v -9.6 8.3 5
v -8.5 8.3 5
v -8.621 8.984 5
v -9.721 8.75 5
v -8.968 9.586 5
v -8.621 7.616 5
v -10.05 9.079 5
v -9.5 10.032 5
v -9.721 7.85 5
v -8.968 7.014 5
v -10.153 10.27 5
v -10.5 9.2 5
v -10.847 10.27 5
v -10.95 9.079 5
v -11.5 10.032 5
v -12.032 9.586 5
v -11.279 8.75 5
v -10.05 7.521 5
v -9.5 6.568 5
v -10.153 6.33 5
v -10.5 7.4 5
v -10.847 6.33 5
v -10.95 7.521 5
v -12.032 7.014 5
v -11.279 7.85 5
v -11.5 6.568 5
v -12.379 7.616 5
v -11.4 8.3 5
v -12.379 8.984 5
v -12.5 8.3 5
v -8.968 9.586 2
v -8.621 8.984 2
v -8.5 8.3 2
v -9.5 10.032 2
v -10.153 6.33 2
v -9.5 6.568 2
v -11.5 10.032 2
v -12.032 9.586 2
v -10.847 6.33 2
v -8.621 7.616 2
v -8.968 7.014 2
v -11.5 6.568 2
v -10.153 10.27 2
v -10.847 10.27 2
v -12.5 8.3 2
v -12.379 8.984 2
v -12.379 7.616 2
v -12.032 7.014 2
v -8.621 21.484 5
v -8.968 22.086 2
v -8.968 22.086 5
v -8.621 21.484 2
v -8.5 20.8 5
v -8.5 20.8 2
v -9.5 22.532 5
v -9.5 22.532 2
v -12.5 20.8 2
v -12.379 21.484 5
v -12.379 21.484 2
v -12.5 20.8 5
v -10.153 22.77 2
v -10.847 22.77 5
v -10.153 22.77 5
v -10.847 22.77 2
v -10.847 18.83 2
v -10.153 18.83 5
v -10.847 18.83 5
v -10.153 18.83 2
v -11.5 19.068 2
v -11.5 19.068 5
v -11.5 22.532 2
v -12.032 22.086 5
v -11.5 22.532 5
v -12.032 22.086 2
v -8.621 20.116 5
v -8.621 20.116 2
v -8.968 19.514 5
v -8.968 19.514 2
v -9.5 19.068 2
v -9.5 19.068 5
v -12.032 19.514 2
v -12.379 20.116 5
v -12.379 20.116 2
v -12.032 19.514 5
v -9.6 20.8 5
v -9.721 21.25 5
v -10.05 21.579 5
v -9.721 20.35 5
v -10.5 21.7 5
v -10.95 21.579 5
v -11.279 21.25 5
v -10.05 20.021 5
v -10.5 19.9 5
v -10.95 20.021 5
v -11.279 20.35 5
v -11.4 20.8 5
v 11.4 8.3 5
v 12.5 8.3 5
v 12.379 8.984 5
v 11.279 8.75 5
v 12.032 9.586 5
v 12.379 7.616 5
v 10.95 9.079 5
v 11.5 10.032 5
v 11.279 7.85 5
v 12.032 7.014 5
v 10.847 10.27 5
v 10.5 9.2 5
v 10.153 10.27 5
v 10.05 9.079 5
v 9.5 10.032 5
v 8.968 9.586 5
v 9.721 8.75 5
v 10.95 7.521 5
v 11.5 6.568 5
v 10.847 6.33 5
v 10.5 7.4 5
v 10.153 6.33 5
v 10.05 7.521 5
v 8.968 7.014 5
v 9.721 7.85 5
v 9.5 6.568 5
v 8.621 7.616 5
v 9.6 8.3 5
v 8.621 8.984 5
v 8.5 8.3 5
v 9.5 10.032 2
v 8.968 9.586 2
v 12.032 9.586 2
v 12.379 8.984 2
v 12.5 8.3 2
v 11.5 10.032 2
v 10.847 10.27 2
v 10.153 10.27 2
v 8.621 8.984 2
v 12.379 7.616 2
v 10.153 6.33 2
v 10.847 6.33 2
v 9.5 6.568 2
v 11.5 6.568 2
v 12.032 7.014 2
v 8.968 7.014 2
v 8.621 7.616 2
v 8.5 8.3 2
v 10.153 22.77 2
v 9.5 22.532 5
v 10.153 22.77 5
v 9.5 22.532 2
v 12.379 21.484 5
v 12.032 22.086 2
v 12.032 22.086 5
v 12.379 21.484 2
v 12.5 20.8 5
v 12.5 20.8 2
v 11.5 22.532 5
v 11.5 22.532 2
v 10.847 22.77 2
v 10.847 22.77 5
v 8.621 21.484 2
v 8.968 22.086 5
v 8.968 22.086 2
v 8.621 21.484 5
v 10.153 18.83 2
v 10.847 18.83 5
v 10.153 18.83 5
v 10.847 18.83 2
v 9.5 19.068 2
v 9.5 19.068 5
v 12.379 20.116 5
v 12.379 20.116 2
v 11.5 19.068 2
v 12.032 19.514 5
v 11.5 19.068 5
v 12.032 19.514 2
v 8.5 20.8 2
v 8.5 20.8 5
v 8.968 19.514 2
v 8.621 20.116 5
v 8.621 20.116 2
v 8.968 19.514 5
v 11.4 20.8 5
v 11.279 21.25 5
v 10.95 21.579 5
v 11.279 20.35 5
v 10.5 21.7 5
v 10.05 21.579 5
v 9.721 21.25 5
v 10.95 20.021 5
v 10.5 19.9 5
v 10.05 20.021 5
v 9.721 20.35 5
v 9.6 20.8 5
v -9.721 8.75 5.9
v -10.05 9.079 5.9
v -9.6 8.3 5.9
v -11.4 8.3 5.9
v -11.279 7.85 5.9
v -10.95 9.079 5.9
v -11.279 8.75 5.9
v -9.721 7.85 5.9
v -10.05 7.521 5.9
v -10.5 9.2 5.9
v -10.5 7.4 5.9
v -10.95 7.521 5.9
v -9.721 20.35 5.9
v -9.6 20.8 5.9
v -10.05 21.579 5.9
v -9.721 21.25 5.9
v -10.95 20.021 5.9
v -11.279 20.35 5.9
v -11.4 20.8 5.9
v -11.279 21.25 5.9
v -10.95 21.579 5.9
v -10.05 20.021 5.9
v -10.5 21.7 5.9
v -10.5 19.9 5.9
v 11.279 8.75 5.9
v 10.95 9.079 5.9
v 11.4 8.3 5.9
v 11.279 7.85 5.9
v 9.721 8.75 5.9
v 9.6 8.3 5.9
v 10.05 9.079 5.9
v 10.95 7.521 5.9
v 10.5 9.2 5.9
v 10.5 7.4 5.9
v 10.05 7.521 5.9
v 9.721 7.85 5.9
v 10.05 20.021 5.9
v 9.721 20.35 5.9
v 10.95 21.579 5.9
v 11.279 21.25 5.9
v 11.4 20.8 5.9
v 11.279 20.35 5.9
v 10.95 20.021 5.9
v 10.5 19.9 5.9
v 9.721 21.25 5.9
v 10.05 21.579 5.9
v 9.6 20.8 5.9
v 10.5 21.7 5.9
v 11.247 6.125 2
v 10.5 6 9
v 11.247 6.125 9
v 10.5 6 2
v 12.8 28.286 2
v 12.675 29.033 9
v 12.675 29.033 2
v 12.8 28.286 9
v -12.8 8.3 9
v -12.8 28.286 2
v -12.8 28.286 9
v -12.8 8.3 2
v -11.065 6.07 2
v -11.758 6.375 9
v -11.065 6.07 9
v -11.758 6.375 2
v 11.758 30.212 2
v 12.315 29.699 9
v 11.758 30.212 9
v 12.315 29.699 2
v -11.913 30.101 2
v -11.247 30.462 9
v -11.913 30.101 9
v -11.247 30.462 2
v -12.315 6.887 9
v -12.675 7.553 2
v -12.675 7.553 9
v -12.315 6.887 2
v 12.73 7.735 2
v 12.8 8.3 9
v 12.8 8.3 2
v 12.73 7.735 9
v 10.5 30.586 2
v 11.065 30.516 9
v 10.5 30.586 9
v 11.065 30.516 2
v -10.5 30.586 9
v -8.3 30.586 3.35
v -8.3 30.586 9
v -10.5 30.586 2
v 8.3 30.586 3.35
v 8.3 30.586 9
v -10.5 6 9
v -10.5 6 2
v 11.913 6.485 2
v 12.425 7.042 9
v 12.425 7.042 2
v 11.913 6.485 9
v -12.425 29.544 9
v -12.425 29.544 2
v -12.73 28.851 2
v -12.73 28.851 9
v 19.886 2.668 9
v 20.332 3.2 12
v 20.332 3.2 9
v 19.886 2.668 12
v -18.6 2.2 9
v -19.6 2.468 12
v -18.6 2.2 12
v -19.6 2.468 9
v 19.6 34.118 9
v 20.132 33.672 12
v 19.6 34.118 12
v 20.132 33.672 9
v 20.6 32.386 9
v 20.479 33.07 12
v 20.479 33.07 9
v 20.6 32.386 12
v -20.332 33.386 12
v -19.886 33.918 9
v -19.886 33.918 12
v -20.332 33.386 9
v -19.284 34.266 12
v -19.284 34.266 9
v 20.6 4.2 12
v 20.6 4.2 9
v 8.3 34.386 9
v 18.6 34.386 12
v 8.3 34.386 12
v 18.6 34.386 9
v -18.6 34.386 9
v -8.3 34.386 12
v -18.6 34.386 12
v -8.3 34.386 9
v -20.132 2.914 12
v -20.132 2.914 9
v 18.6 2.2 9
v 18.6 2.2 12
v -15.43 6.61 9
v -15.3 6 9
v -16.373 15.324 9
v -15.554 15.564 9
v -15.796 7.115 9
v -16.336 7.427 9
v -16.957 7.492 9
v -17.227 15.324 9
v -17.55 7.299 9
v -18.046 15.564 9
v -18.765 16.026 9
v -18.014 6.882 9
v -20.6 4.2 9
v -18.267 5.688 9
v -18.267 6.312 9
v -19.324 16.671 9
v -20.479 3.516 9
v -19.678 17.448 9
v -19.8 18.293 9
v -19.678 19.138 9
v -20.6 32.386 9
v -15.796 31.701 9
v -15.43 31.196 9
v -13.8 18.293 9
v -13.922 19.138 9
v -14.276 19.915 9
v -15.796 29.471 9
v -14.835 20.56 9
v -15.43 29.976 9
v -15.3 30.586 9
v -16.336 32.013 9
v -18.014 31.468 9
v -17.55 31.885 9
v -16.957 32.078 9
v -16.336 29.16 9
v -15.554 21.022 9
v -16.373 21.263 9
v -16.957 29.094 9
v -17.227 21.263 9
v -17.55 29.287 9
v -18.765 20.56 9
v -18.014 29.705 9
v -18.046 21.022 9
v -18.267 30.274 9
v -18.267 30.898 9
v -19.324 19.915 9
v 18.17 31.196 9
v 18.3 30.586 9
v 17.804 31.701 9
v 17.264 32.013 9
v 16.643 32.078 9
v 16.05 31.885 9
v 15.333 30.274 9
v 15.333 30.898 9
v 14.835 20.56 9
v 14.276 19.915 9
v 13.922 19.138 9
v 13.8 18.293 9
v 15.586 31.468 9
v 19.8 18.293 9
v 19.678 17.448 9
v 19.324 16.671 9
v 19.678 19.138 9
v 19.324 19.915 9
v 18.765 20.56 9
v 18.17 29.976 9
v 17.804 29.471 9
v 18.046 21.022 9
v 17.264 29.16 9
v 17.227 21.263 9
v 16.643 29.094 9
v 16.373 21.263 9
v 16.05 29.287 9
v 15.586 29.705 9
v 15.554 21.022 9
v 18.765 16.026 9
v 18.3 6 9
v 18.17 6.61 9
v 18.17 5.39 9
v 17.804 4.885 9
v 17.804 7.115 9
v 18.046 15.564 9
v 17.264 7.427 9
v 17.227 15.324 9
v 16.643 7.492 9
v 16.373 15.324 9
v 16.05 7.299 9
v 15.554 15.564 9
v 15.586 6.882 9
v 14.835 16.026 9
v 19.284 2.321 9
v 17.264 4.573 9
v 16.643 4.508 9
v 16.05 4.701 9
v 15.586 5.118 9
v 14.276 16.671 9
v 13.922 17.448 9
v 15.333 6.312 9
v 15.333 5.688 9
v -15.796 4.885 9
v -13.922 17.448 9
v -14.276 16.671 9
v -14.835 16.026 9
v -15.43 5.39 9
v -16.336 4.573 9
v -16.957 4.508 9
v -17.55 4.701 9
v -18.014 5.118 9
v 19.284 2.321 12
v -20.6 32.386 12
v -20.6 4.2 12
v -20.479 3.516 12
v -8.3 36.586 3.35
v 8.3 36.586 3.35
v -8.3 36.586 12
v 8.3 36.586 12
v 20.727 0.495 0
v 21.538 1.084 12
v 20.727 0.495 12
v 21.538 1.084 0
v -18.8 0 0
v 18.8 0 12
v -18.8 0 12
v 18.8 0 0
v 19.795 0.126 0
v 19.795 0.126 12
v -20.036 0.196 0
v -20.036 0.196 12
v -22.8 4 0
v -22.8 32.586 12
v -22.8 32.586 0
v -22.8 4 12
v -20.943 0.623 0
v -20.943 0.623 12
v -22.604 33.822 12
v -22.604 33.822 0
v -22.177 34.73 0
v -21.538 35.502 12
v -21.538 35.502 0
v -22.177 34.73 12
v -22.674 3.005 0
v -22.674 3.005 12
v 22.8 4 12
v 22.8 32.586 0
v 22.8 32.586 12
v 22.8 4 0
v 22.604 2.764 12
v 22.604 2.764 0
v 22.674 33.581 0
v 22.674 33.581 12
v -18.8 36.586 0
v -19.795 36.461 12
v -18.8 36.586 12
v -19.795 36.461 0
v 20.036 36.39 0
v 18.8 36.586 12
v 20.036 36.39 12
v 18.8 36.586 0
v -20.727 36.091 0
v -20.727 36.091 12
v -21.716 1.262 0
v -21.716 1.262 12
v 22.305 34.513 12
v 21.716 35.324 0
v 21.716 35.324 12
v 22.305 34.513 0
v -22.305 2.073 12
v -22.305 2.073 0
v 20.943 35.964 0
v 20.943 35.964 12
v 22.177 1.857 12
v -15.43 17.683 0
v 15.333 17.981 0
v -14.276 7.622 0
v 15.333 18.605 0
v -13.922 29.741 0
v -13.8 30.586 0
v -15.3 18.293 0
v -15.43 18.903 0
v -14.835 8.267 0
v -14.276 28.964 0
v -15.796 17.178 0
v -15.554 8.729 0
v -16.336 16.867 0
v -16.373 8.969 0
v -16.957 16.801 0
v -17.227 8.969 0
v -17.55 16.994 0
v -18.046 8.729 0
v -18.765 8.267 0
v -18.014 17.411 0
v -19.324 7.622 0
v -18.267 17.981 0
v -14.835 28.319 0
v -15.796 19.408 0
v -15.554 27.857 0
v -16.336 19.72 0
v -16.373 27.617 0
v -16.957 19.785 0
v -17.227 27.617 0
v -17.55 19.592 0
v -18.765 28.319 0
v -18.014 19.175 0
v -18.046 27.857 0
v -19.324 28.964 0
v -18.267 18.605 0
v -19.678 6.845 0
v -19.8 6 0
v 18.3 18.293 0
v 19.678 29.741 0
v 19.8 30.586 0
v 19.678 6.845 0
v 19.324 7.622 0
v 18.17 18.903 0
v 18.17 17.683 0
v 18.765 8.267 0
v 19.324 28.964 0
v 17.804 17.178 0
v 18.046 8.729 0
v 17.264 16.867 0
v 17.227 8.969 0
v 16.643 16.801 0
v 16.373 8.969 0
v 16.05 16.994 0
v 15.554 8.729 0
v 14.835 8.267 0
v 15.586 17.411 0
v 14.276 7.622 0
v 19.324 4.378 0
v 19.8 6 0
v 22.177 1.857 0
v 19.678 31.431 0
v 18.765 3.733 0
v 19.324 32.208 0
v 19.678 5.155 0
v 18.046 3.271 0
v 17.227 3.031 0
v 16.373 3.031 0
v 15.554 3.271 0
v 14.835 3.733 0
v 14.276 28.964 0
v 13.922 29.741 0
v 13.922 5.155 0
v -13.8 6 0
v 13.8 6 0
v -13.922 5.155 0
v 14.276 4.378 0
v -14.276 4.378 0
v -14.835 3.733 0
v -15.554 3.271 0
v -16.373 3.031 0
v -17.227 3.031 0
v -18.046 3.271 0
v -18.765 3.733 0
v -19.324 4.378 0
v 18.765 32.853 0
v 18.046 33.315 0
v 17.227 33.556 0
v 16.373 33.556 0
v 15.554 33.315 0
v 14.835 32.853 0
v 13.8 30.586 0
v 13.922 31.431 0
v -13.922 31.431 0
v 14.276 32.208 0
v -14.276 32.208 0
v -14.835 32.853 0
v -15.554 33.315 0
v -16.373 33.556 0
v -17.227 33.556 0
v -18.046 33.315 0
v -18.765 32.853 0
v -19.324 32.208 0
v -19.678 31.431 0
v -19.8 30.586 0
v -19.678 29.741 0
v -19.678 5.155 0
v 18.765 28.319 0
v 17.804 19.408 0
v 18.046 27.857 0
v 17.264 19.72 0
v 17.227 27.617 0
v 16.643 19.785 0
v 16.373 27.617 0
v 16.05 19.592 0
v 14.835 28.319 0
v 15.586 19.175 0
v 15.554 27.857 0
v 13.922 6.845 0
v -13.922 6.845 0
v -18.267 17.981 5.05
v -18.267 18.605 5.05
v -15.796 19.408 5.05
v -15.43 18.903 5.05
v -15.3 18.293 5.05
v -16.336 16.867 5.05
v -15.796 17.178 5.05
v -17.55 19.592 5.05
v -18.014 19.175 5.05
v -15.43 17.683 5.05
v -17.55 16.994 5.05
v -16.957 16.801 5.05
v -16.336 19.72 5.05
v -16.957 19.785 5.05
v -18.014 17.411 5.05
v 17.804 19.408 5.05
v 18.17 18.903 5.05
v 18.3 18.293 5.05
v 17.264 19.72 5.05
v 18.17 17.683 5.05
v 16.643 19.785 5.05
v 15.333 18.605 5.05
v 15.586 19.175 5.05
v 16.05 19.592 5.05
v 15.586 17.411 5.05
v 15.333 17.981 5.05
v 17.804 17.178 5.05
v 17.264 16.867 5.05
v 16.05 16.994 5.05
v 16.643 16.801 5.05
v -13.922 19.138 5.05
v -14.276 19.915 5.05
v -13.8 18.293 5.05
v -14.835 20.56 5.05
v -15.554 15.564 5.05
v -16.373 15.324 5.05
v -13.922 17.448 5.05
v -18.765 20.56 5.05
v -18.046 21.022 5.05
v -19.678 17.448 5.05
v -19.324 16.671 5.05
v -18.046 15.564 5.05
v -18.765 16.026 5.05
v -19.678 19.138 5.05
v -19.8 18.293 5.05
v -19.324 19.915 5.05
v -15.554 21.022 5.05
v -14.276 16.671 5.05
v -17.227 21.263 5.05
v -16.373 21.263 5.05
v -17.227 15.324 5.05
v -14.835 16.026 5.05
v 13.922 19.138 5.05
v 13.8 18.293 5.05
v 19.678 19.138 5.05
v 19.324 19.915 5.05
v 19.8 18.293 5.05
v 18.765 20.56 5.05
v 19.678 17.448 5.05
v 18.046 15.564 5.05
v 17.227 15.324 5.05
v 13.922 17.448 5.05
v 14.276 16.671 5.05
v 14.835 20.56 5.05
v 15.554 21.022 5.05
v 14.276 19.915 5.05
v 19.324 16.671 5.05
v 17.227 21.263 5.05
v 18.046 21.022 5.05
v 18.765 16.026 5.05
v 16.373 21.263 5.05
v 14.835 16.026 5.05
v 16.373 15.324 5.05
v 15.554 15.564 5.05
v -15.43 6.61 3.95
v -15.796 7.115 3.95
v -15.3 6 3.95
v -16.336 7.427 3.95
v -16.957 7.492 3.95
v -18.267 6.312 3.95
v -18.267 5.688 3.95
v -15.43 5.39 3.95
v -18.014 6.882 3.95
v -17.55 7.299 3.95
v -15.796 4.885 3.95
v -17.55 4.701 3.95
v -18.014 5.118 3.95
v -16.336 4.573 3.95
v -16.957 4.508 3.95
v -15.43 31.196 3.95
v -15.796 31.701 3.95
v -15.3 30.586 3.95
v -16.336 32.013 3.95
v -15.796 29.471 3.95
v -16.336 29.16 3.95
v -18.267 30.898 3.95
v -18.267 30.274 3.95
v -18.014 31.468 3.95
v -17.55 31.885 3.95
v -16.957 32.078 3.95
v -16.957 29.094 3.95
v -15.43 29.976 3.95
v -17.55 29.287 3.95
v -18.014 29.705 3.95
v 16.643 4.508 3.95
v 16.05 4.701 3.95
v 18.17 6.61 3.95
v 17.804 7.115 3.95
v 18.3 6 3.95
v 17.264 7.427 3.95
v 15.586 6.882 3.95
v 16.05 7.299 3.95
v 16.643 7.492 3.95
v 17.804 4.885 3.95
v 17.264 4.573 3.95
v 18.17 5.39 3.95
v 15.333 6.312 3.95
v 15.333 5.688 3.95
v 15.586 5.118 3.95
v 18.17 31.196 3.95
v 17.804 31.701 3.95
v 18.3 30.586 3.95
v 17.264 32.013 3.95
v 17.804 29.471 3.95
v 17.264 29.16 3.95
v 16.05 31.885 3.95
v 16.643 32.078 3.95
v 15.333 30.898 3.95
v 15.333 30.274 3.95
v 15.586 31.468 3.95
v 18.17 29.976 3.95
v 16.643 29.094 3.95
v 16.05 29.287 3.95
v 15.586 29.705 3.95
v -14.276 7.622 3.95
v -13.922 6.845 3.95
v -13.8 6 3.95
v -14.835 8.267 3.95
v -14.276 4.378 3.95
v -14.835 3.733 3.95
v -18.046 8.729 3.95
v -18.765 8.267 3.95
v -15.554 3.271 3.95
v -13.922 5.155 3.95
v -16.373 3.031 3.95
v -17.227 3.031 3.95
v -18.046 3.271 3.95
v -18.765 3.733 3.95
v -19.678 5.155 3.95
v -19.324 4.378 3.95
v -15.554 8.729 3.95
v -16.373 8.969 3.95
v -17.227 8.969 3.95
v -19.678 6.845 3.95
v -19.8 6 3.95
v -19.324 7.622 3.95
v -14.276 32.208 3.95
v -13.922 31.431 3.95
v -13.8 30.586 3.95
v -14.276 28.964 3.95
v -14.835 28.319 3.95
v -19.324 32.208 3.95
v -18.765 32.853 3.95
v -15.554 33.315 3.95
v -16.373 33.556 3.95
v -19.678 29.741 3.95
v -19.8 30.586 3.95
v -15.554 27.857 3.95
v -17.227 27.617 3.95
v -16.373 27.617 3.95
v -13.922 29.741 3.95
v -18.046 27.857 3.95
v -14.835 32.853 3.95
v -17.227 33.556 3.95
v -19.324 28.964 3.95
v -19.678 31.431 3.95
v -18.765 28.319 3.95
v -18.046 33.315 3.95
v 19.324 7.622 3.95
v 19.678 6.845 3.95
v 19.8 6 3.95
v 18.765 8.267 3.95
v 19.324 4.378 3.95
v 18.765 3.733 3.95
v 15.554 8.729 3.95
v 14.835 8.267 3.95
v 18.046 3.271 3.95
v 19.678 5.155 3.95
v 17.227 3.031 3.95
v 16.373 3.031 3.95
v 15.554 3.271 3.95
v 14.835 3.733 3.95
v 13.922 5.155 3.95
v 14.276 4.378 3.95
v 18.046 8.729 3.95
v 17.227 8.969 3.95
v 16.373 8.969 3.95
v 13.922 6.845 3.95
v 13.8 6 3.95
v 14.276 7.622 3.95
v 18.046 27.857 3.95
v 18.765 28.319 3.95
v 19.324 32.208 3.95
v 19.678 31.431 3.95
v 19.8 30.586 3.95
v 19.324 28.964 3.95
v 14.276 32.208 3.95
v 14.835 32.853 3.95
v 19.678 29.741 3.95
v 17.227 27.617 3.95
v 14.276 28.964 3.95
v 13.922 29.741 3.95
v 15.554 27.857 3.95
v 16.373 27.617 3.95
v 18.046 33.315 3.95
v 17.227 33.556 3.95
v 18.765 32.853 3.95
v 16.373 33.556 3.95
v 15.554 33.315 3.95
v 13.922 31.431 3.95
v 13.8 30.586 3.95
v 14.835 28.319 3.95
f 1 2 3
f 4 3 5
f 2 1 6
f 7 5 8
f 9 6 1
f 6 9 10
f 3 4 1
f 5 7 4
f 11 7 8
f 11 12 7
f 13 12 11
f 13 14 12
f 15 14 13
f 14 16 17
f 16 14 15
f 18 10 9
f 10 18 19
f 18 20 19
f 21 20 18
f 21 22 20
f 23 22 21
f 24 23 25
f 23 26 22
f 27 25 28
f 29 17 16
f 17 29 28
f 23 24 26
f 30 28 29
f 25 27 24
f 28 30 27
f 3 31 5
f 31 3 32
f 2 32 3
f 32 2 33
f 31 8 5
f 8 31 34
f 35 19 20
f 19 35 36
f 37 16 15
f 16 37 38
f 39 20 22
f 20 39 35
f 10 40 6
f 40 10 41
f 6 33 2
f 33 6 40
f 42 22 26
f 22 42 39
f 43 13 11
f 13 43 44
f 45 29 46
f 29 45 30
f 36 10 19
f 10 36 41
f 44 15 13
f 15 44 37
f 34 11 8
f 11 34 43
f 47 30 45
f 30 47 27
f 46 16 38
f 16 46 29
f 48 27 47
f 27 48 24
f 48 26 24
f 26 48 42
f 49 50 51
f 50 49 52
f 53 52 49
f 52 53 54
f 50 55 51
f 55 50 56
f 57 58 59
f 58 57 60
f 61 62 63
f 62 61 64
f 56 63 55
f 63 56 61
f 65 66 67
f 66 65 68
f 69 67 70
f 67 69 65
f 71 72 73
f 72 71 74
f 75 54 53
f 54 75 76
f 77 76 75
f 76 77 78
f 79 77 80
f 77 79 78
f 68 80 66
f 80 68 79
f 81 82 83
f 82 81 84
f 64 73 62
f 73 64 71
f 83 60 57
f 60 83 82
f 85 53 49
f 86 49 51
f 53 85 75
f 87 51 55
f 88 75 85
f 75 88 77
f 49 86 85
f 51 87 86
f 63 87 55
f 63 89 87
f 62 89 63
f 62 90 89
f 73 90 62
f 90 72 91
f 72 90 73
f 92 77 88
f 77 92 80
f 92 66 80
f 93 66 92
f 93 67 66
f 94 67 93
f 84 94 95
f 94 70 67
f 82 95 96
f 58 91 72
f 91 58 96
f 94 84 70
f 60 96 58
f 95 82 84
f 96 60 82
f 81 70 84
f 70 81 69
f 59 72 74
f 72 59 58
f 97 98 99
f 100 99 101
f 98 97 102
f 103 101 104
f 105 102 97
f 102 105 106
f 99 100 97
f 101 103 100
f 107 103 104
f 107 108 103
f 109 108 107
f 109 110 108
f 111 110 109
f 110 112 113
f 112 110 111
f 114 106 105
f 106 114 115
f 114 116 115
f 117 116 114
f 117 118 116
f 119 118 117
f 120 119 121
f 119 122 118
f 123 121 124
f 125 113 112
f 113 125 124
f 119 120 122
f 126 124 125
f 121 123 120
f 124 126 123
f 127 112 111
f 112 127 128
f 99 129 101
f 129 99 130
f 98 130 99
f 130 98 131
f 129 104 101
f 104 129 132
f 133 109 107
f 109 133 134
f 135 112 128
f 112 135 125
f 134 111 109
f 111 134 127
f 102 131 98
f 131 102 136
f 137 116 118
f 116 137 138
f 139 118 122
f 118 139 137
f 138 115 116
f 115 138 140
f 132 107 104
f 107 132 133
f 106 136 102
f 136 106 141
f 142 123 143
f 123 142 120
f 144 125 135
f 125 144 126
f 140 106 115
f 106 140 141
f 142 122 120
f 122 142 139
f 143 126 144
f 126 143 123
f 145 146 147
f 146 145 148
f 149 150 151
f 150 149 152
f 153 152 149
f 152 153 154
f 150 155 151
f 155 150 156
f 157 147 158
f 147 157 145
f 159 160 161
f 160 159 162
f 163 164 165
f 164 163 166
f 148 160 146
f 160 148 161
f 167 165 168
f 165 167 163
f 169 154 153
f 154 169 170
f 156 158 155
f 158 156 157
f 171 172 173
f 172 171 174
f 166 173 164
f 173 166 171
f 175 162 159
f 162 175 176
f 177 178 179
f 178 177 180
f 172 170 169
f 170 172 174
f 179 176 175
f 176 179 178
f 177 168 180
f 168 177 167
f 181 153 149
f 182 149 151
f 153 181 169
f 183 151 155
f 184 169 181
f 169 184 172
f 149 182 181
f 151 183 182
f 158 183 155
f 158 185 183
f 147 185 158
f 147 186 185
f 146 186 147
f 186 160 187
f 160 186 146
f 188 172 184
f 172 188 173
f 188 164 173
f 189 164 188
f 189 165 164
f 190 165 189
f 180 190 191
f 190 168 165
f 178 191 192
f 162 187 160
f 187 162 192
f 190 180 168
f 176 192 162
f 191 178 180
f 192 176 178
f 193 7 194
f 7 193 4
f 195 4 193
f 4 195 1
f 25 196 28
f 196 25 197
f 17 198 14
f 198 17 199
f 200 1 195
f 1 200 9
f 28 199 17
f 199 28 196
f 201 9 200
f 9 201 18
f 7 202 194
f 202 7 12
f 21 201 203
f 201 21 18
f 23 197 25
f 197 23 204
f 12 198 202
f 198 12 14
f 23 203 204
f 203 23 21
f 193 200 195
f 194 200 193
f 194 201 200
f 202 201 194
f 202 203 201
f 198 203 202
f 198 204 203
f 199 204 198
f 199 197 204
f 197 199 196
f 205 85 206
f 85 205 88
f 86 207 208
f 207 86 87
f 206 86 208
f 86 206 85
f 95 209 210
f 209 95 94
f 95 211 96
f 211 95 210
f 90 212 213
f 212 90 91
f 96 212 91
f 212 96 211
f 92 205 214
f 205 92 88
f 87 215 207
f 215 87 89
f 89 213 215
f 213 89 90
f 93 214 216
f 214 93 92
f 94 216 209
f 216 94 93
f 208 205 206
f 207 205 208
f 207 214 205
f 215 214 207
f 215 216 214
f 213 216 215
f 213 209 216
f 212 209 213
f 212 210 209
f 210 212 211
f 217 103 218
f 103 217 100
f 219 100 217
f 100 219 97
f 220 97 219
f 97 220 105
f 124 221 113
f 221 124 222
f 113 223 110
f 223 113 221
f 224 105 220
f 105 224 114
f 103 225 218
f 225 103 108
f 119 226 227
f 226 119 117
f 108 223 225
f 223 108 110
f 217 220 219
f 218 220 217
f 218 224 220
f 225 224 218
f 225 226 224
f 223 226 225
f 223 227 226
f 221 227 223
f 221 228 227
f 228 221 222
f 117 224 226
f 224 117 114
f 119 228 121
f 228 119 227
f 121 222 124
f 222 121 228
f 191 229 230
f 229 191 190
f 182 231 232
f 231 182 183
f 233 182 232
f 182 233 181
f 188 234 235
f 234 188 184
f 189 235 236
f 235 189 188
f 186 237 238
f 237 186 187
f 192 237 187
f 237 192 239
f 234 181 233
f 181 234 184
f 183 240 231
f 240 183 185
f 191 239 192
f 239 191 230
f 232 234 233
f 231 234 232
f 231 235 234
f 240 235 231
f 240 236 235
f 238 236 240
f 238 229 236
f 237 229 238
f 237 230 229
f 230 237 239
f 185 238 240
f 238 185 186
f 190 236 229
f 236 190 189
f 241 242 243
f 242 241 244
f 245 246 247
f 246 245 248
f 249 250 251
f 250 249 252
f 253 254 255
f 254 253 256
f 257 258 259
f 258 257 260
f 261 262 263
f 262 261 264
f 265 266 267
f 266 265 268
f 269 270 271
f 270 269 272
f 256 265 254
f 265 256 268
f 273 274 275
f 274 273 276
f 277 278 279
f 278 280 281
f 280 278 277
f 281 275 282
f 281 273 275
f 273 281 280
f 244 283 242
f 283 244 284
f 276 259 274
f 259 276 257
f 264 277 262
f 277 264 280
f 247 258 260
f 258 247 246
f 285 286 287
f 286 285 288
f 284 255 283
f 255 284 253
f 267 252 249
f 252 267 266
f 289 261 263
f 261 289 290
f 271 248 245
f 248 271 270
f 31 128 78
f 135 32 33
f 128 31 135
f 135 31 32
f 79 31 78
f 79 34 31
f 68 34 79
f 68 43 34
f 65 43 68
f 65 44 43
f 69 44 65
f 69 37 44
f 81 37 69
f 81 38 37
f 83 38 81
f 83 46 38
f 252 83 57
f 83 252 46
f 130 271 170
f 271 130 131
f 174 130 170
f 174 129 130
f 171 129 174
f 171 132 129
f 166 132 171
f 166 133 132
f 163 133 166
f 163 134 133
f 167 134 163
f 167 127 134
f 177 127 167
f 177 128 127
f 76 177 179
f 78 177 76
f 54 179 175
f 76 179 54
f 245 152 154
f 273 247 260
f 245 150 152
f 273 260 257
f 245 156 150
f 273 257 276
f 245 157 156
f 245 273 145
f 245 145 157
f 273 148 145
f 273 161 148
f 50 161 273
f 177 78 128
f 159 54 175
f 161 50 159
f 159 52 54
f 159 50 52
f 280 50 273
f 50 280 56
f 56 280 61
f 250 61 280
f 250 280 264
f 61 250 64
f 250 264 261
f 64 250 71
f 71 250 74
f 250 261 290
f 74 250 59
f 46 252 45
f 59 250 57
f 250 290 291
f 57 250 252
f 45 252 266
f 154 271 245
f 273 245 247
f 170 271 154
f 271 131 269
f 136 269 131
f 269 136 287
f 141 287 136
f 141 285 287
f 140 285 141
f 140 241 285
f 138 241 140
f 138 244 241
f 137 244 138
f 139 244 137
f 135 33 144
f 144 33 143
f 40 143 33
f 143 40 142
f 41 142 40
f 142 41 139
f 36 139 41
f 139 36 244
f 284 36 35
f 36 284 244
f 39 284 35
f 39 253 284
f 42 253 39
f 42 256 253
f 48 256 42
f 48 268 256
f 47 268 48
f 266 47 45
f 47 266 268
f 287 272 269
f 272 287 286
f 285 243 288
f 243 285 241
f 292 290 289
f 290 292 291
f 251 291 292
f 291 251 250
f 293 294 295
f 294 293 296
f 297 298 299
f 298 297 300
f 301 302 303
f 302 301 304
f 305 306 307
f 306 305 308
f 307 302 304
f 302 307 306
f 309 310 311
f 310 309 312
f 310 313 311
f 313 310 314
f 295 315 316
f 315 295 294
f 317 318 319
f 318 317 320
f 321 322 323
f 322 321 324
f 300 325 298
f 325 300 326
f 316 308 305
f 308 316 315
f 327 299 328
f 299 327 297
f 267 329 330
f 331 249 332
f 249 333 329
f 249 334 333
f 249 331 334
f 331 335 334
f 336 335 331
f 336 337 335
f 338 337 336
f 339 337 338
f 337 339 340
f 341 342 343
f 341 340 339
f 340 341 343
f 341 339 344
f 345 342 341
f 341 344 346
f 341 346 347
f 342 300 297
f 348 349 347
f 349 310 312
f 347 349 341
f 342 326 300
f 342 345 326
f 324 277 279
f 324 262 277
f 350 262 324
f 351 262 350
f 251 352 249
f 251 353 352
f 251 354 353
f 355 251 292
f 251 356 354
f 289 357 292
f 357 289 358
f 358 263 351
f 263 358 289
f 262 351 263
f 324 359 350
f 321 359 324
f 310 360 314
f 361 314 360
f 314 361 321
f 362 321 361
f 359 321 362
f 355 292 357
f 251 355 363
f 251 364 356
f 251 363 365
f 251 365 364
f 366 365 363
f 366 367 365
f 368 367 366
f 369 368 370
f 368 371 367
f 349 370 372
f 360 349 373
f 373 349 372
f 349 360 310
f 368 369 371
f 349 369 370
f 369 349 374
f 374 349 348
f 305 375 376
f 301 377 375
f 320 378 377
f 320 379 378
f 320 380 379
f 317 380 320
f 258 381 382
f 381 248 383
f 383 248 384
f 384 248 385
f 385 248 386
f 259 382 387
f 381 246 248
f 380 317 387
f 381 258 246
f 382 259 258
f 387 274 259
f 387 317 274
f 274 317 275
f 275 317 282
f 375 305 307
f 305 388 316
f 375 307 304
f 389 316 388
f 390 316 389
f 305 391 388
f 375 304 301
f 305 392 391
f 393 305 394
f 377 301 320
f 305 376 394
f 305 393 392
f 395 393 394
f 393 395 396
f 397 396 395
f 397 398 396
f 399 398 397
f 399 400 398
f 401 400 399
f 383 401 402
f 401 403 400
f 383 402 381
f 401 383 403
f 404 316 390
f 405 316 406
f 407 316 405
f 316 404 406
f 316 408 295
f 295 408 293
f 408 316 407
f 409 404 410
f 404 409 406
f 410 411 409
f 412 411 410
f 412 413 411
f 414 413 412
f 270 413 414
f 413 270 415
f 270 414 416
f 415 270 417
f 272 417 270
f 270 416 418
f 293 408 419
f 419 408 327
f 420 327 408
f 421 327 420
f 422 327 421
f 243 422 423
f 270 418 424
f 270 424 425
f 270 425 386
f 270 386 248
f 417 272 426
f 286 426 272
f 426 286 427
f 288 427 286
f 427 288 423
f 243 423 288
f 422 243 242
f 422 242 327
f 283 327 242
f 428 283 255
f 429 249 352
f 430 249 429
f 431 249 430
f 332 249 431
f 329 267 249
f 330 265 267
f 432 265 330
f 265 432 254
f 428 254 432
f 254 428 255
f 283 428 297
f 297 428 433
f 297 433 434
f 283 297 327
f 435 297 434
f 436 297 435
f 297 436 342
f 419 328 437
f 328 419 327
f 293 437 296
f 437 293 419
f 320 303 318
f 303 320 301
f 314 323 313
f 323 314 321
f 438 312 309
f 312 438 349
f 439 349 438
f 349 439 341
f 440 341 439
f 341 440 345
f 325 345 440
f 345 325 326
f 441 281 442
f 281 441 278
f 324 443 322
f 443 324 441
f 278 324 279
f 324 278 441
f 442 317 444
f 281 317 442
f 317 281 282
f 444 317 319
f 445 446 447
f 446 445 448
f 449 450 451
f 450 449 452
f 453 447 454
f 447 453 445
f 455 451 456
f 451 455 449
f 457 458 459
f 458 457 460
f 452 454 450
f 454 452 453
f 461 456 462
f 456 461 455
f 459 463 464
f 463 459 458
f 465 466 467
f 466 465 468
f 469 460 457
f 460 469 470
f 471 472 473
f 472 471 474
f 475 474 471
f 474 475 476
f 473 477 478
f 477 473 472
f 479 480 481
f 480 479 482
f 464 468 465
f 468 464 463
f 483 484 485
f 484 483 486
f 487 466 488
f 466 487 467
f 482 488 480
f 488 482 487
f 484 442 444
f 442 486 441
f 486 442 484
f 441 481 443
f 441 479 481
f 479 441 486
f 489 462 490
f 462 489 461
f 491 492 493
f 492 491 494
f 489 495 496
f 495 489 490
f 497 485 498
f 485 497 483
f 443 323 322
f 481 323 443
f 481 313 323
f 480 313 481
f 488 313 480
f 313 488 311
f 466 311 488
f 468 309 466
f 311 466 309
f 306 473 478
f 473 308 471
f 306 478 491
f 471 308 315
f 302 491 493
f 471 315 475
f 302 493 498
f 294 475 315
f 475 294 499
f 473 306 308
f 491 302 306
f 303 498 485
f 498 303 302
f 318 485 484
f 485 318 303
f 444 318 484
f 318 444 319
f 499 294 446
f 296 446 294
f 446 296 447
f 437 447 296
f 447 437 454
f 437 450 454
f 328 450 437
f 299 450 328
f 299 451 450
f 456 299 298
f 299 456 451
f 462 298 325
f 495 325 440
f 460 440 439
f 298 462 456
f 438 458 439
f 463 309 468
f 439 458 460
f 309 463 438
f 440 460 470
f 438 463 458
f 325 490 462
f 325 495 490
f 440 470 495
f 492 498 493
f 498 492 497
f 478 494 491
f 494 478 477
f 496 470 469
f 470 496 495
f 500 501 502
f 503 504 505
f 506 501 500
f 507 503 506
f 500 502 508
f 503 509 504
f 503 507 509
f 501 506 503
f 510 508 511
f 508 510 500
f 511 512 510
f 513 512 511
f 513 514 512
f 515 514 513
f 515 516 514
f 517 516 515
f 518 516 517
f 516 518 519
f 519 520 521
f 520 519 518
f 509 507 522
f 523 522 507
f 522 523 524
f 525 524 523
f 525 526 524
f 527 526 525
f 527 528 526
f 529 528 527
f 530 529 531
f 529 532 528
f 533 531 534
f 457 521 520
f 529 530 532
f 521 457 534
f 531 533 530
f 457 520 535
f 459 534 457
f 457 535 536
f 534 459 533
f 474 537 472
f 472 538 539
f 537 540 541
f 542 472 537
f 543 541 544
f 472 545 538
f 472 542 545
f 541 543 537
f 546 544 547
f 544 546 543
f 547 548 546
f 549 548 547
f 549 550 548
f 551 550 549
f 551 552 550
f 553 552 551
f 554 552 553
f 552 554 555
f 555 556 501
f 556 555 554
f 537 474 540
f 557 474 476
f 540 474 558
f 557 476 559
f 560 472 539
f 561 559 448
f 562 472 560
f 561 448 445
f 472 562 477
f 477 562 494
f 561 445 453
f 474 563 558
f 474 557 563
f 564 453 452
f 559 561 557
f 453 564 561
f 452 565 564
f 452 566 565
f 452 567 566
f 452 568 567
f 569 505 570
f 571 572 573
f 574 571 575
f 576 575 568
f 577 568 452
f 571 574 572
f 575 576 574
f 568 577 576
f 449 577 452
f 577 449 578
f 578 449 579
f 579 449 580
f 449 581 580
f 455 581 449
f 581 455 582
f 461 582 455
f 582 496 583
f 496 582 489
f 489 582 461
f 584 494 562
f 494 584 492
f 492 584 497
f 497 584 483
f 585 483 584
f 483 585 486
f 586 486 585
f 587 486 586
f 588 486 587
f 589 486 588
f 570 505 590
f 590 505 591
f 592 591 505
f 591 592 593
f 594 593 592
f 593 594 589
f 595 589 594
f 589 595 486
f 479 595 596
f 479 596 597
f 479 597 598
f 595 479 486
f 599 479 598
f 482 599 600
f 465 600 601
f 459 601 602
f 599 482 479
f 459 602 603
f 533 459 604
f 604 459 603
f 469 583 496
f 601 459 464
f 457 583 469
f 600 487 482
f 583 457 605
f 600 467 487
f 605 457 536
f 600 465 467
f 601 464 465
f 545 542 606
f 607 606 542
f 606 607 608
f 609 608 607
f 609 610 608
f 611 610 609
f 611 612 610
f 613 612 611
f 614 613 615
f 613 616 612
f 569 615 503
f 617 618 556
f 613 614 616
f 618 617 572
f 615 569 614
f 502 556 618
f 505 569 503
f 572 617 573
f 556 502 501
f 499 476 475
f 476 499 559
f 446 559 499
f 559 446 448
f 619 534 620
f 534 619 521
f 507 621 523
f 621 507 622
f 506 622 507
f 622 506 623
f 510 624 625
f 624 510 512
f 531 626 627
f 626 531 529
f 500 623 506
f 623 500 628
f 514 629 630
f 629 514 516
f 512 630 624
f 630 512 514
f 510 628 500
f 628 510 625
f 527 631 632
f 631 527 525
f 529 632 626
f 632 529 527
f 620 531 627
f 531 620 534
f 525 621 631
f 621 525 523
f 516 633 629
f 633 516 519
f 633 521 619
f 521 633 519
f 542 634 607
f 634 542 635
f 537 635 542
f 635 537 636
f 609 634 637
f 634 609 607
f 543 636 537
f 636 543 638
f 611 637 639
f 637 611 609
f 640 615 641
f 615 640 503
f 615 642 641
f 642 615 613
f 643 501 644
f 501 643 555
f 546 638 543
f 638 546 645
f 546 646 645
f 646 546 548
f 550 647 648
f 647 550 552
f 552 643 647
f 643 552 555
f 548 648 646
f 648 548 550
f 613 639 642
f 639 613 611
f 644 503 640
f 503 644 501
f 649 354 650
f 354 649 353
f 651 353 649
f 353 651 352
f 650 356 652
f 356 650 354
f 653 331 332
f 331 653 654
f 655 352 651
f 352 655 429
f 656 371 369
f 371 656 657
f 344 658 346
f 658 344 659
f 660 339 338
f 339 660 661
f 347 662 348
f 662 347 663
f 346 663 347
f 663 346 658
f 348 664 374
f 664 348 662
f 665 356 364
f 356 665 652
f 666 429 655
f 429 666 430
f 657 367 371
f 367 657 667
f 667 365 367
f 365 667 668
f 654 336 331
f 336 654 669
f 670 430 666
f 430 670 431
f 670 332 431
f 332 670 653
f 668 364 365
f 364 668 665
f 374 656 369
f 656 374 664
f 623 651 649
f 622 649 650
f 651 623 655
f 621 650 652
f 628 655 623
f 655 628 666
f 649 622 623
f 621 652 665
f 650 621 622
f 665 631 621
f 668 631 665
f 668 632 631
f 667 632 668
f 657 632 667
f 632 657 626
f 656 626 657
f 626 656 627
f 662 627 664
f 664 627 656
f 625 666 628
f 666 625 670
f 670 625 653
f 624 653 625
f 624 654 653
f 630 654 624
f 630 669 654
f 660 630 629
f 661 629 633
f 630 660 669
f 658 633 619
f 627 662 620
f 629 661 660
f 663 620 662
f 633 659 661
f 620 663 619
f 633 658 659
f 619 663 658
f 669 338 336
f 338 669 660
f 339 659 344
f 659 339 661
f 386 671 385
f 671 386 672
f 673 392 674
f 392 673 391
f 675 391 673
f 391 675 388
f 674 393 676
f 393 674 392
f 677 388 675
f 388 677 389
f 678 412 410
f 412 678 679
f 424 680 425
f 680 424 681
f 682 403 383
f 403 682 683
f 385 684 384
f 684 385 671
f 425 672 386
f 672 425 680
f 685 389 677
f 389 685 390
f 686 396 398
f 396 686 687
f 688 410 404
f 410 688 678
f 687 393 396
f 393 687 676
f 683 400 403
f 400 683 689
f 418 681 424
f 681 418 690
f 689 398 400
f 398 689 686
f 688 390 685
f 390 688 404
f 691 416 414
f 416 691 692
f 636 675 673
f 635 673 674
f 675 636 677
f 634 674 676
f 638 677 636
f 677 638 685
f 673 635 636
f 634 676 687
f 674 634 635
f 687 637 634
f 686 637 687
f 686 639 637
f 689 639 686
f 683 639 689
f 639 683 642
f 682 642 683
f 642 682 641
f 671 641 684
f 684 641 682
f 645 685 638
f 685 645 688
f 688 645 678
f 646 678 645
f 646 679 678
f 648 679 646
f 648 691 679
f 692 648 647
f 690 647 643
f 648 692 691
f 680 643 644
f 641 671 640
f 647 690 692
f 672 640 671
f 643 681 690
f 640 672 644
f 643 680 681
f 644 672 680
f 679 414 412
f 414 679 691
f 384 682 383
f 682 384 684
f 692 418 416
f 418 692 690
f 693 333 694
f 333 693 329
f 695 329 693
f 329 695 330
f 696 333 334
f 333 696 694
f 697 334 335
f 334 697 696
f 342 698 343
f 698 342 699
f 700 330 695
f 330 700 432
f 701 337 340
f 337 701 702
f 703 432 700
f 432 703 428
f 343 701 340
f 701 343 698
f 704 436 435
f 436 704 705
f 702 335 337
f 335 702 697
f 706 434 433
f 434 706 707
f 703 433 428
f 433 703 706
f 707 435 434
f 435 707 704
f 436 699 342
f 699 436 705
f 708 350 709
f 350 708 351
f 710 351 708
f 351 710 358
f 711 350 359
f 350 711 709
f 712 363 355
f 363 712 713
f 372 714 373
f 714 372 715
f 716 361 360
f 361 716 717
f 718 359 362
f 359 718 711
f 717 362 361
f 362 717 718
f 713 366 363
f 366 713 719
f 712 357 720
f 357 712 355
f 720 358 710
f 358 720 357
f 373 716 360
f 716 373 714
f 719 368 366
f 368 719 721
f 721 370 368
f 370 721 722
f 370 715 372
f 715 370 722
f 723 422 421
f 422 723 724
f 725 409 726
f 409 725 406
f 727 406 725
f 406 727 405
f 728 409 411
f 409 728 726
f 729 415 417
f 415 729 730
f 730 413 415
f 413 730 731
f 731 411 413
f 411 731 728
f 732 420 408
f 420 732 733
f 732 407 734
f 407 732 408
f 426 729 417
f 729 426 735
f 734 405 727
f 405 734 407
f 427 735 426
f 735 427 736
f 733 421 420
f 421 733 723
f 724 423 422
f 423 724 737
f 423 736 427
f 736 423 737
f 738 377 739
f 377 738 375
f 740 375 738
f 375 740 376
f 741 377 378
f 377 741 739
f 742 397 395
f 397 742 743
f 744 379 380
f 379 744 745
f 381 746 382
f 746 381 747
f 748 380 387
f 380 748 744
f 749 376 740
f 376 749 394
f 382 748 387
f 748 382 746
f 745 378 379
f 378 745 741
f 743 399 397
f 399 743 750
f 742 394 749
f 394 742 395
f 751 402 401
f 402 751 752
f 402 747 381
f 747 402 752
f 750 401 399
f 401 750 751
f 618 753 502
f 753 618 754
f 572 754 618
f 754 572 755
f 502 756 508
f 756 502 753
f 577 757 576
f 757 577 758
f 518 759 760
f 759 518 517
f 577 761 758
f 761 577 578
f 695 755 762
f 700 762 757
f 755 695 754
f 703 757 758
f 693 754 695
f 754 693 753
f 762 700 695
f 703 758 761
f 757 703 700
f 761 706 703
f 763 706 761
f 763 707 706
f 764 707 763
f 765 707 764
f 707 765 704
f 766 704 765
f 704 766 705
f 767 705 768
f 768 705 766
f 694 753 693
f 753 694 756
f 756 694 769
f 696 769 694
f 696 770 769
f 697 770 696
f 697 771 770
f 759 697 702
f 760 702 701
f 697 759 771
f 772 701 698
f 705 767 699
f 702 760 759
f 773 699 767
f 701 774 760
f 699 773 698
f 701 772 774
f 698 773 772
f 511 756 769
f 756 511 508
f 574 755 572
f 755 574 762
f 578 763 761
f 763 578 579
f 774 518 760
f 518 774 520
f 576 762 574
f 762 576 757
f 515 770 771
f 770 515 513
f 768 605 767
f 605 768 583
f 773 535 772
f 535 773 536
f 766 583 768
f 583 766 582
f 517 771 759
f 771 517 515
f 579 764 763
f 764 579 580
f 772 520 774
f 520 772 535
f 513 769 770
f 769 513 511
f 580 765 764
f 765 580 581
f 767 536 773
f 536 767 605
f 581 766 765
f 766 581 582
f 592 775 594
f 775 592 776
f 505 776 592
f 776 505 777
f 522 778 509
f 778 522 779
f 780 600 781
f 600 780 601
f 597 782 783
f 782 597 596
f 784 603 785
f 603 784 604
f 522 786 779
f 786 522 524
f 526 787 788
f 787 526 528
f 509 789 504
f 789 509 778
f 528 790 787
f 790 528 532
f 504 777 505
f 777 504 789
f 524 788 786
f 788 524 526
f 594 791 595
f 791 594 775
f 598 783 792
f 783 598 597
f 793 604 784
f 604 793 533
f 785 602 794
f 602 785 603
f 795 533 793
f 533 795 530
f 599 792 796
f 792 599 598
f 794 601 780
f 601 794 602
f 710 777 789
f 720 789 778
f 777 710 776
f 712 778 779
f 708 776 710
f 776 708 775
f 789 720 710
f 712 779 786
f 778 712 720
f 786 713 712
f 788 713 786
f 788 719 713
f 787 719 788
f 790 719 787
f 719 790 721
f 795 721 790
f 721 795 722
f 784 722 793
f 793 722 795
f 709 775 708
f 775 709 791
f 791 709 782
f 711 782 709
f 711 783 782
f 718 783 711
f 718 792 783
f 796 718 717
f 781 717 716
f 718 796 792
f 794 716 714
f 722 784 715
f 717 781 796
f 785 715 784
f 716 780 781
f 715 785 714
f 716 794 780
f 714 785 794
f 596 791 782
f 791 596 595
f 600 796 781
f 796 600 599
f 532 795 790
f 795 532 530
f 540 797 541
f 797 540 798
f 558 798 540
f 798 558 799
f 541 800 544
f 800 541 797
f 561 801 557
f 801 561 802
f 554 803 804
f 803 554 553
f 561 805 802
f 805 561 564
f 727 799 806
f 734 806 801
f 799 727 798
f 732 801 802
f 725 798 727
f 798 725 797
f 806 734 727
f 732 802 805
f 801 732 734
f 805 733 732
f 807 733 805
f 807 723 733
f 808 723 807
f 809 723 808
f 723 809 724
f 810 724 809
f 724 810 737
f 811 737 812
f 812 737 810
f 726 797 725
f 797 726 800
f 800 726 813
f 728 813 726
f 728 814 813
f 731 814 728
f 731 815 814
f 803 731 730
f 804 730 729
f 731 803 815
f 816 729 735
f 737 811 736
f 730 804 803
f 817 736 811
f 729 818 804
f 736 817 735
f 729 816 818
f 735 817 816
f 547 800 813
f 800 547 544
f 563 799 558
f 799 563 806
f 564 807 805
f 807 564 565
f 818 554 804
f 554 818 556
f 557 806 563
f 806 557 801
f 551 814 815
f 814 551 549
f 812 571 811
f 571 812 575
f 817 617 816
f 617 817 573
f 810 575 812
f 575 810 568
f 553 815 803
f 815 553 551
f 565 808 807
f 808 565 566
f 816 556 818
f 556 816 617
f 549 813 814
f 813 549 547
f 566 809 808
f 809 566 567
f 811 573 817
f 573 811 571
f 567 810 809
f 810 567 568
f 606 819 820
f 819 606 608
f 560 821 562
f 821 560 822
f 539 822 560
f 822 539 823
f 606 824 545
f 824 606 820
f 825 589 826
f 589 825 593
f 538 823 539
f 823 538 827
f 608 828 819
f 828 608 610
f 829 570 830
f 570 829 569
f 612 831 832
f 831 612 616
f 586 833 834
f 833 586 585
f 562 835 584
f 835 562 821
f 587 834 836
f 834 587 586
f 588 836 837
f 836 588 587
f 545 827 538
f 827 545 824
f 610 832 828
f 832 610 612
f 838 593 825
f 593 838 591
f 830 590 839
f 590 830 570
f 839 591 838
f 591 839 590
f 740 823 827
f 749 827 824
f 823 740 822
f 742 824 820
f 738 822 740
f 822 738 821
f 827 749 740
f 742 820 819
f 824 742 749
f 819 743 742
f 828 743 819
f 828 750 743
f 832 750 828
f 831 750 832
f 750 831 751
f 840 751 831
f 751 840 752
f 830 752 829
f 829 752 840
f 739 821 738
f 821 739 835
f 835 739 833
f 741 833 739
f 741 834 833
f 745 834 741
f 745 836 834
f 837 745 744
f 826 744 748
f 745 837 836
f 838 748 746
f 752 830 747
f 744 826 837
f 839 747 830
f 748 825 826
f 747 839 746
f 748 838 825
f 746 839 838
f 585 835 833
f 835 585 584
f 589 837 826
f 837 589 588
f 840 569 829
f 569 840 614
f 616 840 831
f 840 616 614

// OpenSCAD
//------------------------------------------------------------------
/*

Housing for RPi Camera Module V2.1
See: https://www.raspberrypi.org/documentation/hardware/camera/rpi-cam-v2_1-dimensions.pdf

*/
//------------------------------------------------------------------

// camera board
camera_board_x = 25;
camera_board_y = 23.9862;
camera_board_z = 0.95;
camera_hole_diameter = 2.2;
camera_hole_to_edge = 2;
camera_hole_x = 21;
camera_hole_y = 12.5;

// camera body
camera_body_x = 8.3;
camera_body_y = 8.3;
camera_body_y_ofs = 10.3;
camera_body_z0 = 2.2;
camera_body_z1 = 4.5;
camera_body_diameter = 7.1;

// camera cable
camera_cable_x = 16;
camera_cable_y = 30;
camera_cable_z = 0.1;

// camera connector
camera_connector_x = 20.8;
camera_connector_y = 5.5;
camera_connector_z = 2.7;

// camera housing
housing_hole_clearance = 0.2;
housing_board_clearance = 0.3;
housing_lid_clearance = 0.4;
housing_cable_clearance = 0.3;
housing_wall_t0 = 6; // thick wall in board cavity
housing_wall_t1 = 2; // thin wall in lid cavity
housing_sides = 10;
housing_rounding = 4;
housing_x = camera_board_x + 2 * (housing_board_clearance + housing_sides);
housing_y = camera_board_y + 2 * (housing_board_clearance + housing_wall_t0);
housing_z = 12;
backside_clearance = 3;
housing_post_z = max(camera_connector_z, backside_clearance);
housing_base_z = 2;

// camera lid
lid_x = housing_x - 2 * (housing_lid_clearance + housing_wall_t1);
lid_y = housing_y - 2 * (housing_lid_clearance + housing_wall_t1);
lid_z = 3;
lid_camera_clearance = 0.4;

// mounting holes
mount_hole_to_edge = 6;
mount_hole_diameter = 3;
mount_hole_x = housing_x - (2 * mount_hole_to_edge);
mount_hole_y = housing_y - (2 * mount_hole_to_edge);

// For counter sinking bolt holes to mount 
counter_sink_depth = 4;
counter_sink_ofs = housing_sides - 1 - counter_sink_depth;
counter_sink_diameter = mount_hole_diameter * 2;

//------------------------------------------------------------------
// utility functions

// scaling
pla_shrink = 1/0.999; //~0.1%
abs_shrink = 1/0.995; //~0.5%

// small tweak to avoid differencing artifacts
epsilon = 0.05;

// control the number of facets on cylinders
facet_epsilon = 0.03;
function facets(r) = 180 / acos(1 - (facet_epsilon / r));

// rounded/filleted edges
module inverse() {
  difference() {
    square(1e5, center=true);
    children(0);
  }
}
module rounded(r=1) {
  offset(r=r, $fn=facets(r)) offset(r=-r, $fn=facets(r)) children(0);
}
module filleted(r=1) {
  offset(r=-r, $fn=facets(r)) render() offset(r=r, $fn=facets(r)) children(0);
}

//------------------------------------------------------------------
// camera board

module camera_holes(r, h) {
  dx = camera_hole_x;
  dy = camera_hole_y;
  posn = [[0,0], [0,1], [1,0], [1,1]];
  for (x = posn) {
    translate([x[0] * dx, x[1] * dy, 0])
      cylinder(h=h, r=r, $fn=facets(r));
  }
}

module camera_pcb_holes() {
  r = camera_hole_diameter/2;
  h = camera_board_z + (2 * epsilon);
  x_ofs = camera_hole_to_edge;
  y_ofs = camera_hole_to_edge;
  translate([x_ofs,y_ofs,-epsilon])camera_holes(r,h);
}

module camera_pcb() {
  difference() {
    linear_extrude(height=camera_board_z)
      rounded(r=camera_hole_to_edge)
      square(size=[camera_board_x, camera_board_y]);
    camera_pcb_holes();
  }
}

module camera_body() {
  dx = (camera_board_x - camera_body_x)/2;
  translate([dx,camera_body_y_ofs,camera_board_z]) {
    r = camera_body_diameter/2;
    dx = camera_body_x/2;
    dy = camera_body_y/2;
    cube(size=[camera_body_x,camera_body_y,camera_body_z0]);
    translate([dx,dy,0]) cylinder(h=camera_body_z1, r=r, $fn=facets(r));
  }
}

module camera_cable() {
  x_ofs = (camera_board_x - camera_cable_x)/2;
  y_ofs = camera_board_y - (camera_connector_y/2);
  z_ofs = -camera_connector_z / 2;
  translate([x_ofs,y_ofs,z_ofs])
    cube(size=[camera_cable_x,camera_cable_y,camera_cable_z]);
}

module camera_connector() {
  x_ofs = (camera_board_x - camera_connector_x)/2;
  y_ofs = camera_board_y - camera_connector_y;
  z_ofs = -camera_connector_z;
  translate([x_ofs,y_ofs,z_ofs])
    cube(size=[camera_connector_x,camera_connector_y,camera_connector_z]);
}

module camera_board() {
  x_ofs = -camera_board_x/2;
  y_ofs = housing_board_clearance + housing_wall_t0;
  z_ofs = housing_base_z + housing_post_z;
  translate([x_ofs,y_ofs,z_ofs]) {
    color("DarkGreen") camera_pcb();
    color("DimGray") camera_body();
    color("LightBlue") camera_cable();
    color("SaddleBrown") camera_connector();
  }
}

//------------------------------------------------------------------

module housing_external() {
  linear_extrude(height=housing_z)
    rounded(r=housing_rounding)
    square(size=[housing_x, housing_y]);
}

module housing_cavity() {
  h = housing_z - housing_base_z + epsilon;
  x = camera_board_x + (2 * housing_board_clearance);
  y = camera_board_y + (2 * housing_board_clearance);
  x_ofs = (housing_x - x) / 2;
  y_ofs = (housing_y - y) / 2;
  r = camera_hole_to_edge + housing_board_clearance;
  translate([0,0,housing_base_z])
    linear_extrude(height=h)
    translate([x_ofs,y_ofs])
    rounded(r=r)
    square(size=[x, y]);
}

module supports() {
  r0 = camera_hole_to_edge;
  h0 = housing_post_z + epsilon;
  r1 = (camera_hole_diameter / 2) - housing_hole_clearance;
  h1 = h0 + camera_board_z - epsilon;
  x_ofs = (housing_x - camera_hole_x) / 2;
  y_ofs = housing_wall_t0 + housing_board_clearance + camera_hole_to_edge;
  z_ofs = housing_base_z - epsilon;
  translate([x_ofs,y_ofs,z_ofs]) {
    camera_holes(r0,h0);
    camera_holes(r1,h1);
  }
}

module lid_cavity() {
  h = lid_z + epsilon;
  z_ofs = housing_z - lid_z;
  translate([0,0,z_ofs]) linear_extrude(height=h) {
    x = lid_x + housing_lid_clearance;
    y = lid_y + housing_lid_clearance;
    x_ofs = (housing_x - x) / 2;
    y_ofs = (housing_y - y) / 2;
    r = housing_rounding - housing_wall_t1;
    translate([x_ofs,y_ofs])
      rounded(r=r)
      square(size=[x,y]);
  }
}

module cable_cavity() {
  x = camera_cable_x + (2 * housing_cable_clearance);
  y = ((housing_y - camera_board_y)/2) - housing_board_clearance + (2 * epsilon);
  x_ofs = (housing_x - x) / 2;
  y_ofs = housing_y - y + epsilon;
  z_ofs = housing_base_z + housing_post_z - (camera_connector_z / 2) - housing_cable_clearance;
  translate([x_ofs,y_ofs,z_ofs]) linear_extrude(height=housing_z) {
     square(size=[x,y]);
  }
}

module housing() {
  x_ofs = -housing_x / 2;
  translate([x_ofs, 0, 0]) {
    supports();
    difference() {
      union() {
        housing_external();
      }
      union() {
        housing_cavity();
        lid_cavity();
        cable_cavity();
      }
    }
  }
}

//------------------------------------------------------------------

module lid_top() {
  x = lid_x;
  y = lid_y;
  x_ofs = x / 2;
  y_ofs = (housing_y - y) / 2;
  z_ofs = housing_z - lid_z;
  r = housing_rounding - housing_wall_t1 - housing_lid_clearance;
  translate([-x_ofs,y_ofs,z_ofs]) linear_extrude(height=lid_z) {
    rounded(r=r)
     square(size=[x,y]);
  }
}

module lid_tab() {
  x = camera_cable_x + (2 * (housing_cable_clearance - housing_lid_clearance));
  y = housing_wall_t1 + (housing_wall_t0 / 2);
  z = housing_z - housing_base_z - housing_post_z + (camera_connector_z / 2) - housing_cable_clearance;
  x_ofs = -x/2;
  y_ofs = housing_y - y;
  z_ofs = housing_z - z;
  translate([x_ofs,y_ofs,z_ofs])
    cube(size=[x,y,z]);
}

module lid_rail() {
  x = camera_hole_diameter;
  y = camera_board_y;
  z = housing_z - lid_z - housing_base_z - housing_post_z - camera_board_z + epsilon;
  x_ofs = (camera_hole_x - camera_hole_to_edge) / 2;
  y_ofs = housing_board_clearance + housing_wall_t0;
  z_ofs = housing_base_z + housing_post_z + camera_board_z + epsilon;
  translate([x_ofs,y_ofs,z_ofs])
    cube(size=[x,y,z]);
}

module lid_rails() {
  lid_rail();
  mirror([1,0,0]) lid_rail();
}

module lid_camera_hole() {
  h = lid_z + (2 * epsilon);
  r = (camera_body_diameter / 2) + lid_camera_clearance;
  y_ofs = housing_wall_t0 + housing_board_clearance + camera_body_y_ofs + (camera_body_y/2);
  z_ofs = housing_z - lid_z - epsilon;
  translate([0,y_ofs,z_ofs])
    cylinder(h=h, r=r, $fn=facets(r));
}

module lid() {
  difference() {
    union() {
      lid_top();
      lid_tab();
      lid_rails();
    }
    lid_camera_hole();
  }
}

//------------------------------------------------------------------

module mount_hole_posn(r, h) {
  dx = mount_hole_x;
  dy = mount_hole_y;
  posn = [[0,0], [0,1], [1,0], [1,1]];
  for (x = posn) {
    translate([x[0] * dx, x[1] * dy, 0])
      cylinder(h=h, r=r, $fn=facets(r));
  }
}

module mount_holes() {
  r = mount_hole_diameter / 2;
  h = housing_z + (2 * epsilon);
  x_ofs = mount_hole_x / 2;
  y_ofs = (housing_y - mount_hole_y) / 2;
  translate([-x_ofs,y_ofs,-epsilon])
  mount_hole_posn(r=r, h=h);
  translate([-x_ofs,y_ofs,-epsilon])
  mount_hole_posn(r=counter_sink_diameter / 2, h=counter_sink_depth);
}

module mount_hole_back_posn() {
  dx = mount_hole_x;
  dy = mount_hole_y;
  posn = [[0,0.5], [1,0.5]];
  for (x = posn) {
    translate([x[0] * dx, x[1] * dy, 0])
      cylinder(h=h, r=r, $fn=facets(r));
  }
}

module mount_holes_back() {
  r = mount_hole_diameter / 2;
  h = housing_z + (2 * epsilon);
  x_ofs = mount_hole_x / 2;
  y_ofs = (housing_y - mount_hole_y) / 2;
  translate([-x_ofs,y_ofs,-epsilon])
  mount_hole_back_posn(r=r, h=h);
  translate([-x_ofs,y_ofs,counter_sink_ofs + epsilon])
  mount_hole_back_posn(r=counter_sink_diameter / 2, h=counter_sink_depth);
}

//------------------------------------------------------------------

module everything() {
difference () {
  union() {
    difference() {
        housing();
        mount_holes_back();
    }
    lid();
  }
  mount_holes();
}

camera_board();
}

module back_side() {
    difference() {
        housing();
        mount_holes_back();
        mount_holes();
    }
}

module cover() {
    difference() {
        lid();
        mount_holes();
    }
}

//------------------------------------------------------------------

//everything();
back_side();
//camera_board();
//cover();
